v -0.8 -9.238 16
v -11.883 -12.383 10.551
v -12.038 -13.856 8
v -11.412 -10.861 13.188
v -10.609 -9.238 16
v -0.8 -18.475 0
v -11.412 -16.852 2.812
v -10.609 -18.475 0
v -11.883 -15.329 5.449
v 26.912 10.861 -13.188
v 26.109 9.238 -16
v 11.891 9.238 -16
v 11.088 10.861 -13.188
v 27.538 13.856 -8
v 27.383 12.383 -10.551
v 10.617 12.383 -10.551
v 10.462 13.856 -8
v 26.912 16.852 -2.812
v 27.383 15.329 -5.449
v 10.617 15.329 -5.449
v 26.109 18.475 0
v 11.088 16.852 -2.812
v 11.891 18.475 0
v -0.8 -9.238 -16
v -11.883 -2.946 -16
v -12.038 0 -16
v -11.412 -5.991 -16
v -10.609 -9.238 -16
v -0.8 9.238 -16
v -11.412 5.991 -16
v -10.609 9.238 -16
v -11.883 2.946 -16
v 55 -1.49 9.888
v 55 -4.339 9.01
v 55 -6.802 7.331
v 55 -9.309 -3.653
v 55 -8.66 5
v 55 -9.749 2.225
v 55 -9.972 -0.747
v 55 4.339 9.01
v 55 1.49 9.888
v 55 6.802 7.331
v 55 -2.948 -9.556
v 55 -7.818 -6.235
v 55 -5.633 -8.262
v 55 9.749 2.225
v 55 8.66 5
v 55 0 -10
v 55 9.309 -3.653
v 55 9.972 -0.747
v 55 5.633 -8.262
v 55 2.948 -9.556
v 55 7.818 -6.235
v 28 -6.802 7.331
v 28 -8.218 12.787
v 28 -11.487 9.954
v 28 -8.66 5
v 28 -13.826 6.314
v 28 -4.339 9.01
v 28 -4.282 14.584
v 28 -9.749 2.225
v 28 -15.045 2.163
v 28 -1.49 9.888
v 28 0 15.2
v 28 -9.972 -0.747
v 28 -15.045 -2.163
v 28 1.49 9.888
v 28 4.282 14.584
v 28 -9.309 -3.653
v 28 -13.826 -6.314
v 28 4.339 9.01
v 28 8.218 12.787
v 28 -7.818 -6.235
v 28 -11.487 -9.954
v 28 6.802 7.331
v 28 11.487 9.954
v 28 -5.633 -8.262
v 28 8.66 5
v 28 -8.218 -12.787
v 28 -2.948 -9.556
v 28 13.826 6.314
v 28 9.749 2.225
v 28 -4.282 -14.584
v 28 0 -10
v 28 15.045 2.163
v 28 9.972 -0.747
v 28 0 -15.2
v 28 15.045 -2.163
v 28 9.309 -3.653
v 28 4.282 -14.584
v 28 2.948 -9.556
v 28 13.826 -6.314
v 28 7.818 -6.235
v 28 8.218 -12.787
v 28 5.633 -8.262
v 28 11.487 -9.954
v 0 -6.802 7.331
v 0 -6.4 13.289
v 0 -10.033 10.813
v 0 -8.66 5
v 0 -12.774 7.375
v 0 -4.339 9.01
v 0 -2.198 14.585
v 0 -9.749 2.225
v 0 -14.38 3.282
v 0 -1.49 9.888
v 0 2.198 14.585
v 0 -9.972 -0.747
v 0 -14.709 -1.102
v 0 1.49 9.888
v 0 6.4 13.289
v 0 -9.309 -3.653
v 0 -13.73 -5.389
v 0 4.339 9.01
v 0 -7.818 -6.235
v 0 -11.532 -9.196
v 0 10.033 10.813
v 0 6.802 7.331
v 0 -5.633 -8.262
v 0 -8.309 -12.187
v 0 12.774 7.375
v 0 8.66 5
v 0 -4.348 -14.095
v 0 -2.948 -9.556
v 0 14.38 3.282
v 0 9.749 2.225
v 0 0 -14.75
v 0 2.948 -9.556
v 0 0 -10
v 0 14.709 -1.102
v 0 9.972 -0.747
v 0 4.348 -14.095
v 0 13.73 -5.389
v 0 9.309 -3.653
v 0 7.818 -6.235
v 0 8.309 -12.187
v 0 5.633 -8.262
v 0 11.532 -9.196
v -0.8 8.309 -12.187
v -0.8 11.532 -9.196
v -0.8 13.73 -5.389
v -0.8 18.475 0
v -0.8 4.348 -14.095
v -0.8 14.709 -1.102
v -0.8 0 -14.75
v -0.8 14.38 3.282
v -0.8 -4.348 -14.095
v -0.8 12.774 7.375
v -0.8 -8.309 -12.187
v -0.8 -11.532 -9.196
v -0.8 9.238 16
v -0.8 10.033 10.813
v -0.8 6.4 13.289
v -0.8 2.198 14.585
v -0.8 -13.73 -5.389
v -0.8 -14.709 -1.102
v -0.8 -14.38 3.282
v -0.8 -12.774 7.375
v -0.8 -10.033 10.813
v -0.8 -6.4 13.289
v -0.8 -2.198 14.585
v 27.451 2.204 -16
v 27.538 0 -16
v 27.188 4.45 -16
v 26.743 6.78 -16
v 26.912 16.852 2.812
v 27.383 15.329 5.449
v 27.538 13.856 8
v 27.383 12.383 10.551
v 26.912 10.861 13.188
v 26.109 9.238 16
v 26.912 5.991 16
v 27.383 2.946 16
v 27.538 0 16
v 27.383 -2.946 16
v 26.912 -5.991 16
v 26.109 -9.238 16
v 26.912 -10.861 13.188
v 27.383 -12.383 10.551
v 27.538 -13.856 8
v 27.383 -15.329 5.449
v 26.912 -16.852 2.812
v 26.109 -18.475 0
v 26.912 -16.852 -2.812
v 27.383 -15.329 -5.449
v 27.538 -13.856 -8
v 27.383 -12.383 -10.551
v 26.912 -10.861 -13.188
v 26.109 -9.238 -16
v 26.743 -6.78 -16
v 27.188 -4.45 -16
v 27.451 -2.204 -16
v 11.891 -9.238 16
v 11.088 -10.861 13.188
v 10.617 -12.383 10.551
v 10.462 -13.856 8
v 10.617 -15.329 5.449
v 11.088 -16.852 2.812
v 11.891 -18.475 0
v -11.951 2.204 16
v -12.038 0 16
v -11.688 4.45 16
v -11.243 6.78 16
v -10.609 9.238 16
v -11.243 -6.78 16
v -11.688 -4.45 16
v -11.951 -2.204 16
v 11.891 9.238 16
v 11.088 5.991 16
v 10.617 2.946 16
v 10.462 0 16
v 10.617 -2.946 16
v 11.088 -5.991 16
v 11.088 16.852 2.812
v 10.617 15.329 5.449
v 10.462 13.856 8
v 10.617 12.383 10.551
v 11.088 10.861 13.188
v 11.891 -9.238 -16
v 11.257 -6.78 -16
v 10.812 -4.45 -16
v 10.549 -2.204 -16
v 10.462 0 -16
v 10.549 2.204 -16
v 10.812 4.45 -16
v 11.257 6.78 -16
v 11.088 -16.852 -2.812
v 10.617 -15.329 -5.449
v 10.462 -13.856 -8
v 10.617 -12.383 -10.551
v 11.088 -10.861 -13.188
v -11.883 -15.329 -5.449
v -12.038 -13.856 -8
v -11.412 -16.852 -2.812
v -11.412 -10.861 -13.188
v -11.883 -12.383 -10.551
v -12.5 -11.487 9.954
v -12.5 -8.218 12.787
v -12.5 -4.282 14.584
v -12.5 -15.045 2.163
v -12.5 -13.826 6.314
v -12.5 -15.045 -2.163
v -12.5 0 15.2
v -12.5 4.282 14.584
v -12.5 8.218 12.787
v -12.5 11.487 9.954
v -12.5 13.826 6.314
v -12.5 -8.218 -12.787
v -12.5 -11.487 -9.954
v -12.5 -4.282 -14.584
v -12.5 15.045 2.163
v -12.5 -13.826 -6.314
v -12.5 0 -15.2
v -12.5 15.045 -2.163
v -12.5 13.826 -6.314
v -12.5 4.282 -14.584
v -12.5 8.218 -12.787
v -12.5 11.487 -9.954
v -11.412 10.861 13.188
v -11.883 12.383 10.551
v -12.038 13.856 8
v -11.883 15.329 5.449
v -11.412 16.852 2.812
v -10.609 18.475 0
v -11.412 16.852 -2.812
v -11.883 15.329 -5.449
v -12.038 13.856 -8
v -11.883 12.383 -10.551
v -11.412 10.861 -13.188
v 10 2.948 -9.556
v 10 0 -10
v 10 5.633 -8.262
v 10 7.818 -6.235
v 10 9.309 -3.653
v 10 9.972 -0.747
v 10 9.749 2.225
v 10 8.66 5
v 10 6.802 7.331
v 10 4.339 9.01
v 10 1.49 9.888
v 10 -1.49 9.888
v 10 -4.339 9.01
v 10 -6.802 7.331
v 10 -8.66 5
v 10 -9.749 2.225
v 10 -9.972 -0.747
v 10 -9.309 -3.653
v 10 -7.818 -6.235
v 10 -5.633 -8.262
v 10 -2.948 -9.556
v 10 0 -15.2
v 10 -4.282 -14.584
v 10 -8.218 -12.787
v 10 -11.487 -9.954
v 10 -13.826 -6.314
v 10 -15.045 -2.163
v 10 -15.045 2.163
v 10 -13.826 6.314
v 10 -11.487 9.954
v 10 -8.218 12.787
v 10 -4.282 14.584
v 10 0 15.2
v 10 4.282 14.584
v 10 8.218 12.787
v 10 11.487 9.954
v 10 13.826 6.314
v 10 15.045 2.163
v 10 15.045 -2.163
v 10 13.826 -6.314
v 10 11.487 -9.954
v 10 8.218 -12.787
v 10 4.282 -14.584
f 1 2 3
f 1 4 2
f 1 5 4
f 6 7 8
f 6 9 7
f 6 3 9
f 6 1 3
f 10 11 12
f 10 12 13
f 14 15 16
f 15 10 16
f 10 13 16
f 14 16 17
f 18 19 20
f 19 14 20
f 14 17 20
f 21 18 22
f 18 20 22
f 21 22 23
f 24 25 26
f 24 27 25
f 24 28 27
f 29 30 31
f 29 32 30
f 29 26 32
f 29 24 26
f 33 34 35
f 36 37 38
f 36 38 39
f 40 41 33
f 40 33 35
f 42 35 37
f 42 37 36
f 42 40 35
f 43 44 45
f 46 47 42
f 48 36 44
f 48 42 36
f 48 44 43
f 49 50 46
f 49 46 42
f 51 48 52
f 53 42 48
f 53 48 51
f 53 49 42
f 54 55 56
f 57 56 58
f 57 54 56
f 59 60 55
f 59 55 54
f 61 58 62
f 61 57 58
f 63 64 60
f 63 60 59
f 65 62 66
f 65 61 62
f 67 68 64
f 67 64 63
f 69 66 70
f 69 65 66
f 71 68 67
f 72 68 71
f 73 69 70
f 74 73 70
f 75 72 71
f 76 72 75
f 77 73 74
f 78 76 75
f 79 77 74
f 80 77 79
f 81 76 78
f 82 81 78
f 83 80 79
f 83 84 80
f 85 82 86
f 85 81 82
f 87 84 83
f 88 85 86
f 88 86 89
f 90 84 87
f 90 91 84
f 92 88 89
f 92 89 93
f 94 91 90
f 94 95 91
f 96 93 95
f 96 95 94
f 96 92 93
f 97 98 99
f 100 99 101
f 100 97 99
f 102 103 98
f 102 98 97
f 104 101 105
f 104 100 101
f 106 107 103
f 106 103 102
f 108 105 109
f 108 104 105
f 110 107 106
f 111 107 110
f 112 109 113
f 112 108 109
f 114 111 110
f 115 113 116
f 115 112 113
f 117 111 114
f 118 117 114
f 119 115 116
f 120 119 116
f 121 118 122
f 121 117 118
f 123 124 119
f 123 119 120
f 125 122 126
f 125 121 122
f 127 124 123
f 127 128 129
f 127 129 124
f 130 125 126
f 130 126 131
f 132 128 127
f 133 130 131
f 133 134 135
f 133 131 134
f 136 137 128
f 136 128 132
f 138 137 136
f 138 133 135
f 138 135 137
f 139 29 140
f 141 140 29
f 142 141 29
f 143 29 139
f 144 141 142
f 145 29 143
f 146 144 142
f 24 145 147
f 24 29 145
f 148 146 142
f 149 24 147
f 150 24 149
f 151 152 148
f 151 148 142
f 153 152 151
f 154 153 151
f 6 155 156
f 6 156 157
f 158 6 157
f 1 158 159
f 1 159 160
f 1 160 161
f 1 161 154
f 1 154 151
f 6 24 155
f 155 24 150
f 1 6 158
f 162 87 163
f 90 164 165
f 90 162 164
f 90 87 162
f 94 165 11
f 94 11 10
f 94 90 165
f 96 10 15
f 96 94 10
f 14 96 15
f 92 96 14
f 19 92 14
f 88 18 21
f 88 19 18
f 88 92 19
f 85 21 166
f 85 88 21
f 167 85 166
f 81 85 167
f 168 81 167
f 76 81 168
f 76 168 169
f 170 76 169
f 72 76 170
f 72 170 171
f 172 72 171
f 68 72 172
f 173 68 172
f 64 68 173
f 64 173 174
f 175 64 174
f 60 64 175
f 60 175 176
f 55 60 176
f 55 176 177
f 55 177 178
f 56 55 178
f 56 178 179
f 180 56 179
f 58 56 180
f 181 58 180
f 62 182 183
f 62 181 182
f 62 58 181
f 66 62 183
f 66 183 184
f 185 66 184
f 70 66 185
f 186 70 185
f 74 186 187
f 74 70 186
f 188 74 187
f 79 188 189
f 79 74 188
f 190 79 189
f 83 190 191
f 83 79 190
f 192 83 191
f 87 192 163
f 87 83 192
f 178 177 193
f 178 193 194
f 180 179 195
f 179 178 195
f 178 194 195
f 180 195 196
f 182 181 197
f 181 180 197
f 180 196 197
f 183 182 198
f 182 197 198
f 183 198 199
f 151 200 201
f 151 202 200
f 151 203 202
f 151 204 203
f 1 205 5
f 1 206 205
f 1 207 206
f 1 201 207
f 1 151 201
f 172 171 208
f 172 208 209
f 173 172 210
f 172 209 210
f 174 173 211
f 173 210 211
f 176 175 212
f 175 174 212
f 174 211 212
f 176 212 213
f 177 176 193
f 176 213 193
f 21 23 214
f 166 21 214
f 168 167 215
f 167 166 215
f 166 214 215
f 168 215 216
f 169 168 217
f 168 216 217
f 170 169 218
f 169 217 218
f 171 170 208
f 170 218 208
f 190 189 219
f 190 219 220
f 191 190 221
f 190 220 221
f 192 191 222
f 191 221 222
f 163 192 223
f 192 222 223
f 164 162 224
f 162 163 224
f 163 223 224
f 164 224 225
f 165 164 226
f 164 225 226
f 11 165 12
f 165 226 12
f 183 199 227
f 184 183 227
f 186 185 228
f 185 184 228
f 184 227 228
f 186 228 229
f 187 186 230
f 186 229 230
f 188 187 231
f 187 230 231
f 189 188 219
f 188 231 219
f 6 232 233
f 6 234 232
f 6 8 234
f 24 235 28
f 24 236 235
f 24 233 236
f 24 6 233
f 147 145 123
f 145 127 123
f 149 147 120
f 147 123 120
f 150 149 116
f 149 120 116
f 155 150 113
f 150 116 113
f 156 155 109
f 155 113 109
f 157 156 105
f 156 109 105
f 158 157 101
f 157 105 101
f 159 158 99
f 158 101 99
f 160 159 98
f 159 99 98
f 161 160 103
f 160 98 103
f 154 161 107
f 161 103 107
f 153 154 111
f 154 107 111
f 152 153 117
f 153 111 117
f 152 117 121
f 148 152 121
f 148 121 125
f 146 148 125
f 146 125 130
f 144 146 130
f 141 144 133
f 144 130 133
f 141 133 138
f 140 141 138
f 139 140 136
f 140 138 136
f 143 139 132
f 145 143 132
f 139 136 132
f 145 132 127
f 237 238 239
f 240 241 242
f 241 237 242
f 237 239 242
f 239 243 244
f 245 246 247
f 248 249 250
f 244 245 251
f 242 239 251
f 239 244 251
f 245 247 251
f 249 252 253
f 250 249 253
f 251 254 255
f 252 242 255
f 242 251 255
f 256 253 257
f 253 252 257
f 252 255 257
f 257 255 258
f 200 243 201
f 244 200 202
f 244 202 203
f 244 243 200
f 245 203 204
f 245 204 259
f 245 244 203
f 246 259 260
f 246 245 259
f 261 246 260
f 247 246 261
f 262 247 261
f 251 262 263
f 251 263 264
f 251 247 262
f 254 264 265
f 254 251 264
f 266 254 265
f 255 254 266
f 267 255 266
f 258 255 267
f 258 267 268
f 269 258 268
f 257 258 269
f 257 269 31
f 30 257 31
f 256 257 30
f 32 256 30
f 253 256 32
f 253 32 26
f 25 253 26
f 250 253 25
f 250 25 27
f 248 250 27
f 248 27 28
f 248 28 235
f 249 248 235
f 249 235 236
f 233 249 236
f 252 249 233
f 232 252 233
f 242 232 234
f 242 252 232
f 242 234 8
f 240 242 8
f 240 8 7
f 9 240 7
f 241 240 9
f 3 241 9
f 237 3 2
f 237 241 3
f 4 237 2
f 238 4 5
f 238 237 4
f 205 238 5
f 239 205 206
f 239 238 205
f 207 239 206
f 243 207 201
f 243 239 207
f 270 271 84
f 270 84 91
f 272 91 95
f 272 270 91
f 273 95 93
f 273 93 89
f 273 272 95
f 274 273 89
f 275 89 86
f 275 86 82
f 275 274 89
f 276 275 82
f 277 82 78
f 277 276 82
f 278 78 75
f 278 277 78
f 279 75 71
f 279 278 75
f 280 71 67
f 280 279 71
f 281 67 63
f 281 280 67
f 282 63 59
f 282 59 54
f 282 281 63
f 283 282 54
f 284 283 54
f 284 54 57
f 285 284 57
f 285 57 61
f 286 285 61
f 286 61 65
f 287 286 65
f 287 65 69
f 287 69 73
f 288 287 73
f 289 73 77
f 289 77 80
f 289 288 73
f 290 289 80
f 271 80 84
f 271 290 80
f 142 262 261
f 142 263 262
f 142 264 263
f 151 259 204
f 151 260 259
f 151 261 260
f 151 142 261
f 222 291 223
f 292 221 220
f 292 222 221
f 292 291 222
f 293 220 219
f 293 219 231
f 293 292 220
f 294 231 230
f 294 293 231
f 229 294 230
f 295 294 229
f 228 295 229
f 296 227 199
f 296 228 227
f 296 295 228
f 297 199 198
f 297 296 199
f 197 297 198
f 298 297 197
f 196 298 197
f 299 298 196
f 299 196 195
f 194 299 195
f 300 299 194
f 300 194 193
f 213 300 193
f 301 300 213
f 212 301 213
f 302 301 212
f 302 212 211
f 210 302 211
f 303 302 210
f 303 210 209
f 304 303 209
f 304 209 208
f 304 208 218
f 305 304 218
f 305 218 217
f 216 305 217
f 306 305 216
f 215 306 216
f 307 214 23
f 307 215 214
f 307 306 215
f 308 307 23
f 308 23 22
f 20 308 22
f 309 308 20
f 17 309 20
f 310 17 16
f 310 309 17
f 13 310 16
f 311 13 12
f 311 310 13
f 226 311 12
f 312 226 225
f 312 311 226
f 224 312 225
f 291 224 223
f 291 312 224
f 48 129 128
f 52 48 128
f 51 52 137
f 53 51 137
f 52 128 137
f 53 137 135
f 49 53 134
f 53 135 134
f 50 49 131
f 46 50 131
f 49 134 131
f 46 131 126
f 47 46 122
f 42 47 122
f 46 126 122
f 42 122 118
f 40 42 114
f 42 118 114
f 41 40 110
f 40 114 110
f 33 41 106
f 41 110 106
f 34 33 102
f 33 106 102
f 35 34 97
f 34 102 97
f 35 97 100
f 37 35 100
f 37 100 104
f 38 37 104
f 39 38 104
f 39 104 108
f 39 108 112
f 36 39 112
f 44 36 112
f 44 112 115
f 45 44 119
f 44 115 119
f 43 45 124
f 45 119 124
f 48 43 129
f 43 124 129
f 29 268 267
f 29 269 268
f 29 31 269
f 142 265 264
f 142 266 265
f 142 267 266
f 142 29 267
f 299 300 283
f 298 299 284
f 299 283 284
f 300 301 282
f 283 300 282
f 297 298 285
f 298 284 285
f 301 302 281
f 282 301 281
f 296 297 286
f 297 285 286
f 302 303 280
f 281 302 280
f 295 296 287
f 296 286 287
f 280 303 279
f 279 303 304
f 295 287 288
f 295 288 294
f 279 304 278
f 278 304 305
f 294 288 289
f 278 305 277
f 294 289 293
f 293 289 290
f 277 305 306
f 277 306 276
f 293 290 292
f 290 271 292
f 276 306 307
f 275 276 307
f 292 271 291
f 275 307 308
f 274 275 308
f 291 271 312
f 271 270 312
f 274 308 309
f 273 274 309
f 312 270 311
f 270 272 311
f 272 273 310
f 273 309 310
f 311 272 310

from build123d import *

# Parameters (mm, degrees)
BOLTHEAD_DEPTH                       = 12.5
UNBOLTHEADSK_W                       = 0.8
UNBOLTHEADSK_H                       = 3.725208614
BOLTBODYSK_R                         = 10
BOLTBODY_DEPTH                       = 55
BOLTHCSK_OUTSIDE_W                   = 302.814
BOLTHCSK_OUTSIDE_H                   = 307.764
BOLTHCSK_OUTSIDE_R                   = 15.2
BOLTHEADCHAMFER_DEPTH                = 72.788462397
BOLTHEADCHAMFER_DRAFT                = -60
NUTHEADSK_R                          = 10
NUTHEAD_DEPTH                        = 18
NUTHCSK_OUTSIDE_W                    = 217.994
NUTHCSK_OUTSIDE_H                    = 222.944
NUTHCSK_OUTSIDE_R                    = 15.2
NUTHEADCHAMFER_DEPTH                 = 48.303100674
NUTHEADCHAMFER_DRAFT                 = -60
NUTHEADCHAMFERMIRROR_COPY_1_SKETCH_W = 217.994
NUTHEADCHAMFERMIRROR_COPY_1_SKETCH_H = 222.944
NUTHEADCHAMFERMIRROR_COPY_1_SKETCH_R = 15.2
NUTHEADCHAMFERMIRROR_COPY_1_DEPTH    = 48.303100674
NUTHEADCHAMFERMIRROR_COPY_1_DRAFT    = -60


with BuildPart() as part:
    # BoltHeadSk → BoltHead (new body)
    with BuildSketch(Plane(origin=(0, 0, 0), x_dir=(0, 0, -1), z_dir=(1, 0, 0))):
        Polygon((0, 18.475208614), (-16, 9.237604307), (-16, -9.237604307), (0, -18.475208614), (16, -9.237604307), (16, 9.237604307), align=None)
    extrude(amount=-BOLTHEAD_DEPTH)

    # UnBoltHeadSk → UNBoltHead (revolve, cut)
    with BuildSketch(Plane.XY, mode=Mode.PRIVATE) as unbolthead_sk:
        with Locations((-0.4, 16.612604307)):
            Rectangle(UNBOLTHEADSK_W, UNBOLTHEADSK_H)
    revolve(unbolthead_sk.sketch.rotate(Axis((0, 0, 0), (-1, 0, 0)), 90), axis=Axis((0, 0, 0), (-1, 0, 0)), mode=Mode.SUBTRACT)

    # BoltBodySk → BoltBody (add)
    with BuildSketch(Plane(origin=(0, 0, 0), x_dir=(0, 0, -1), z_dir=(1, 0, 0))):
        Circle(BOLTBODYSK_R)
    extrude(amount=BOLTBODY_DEPTH)


with BuildPart() as boltheadchamfer_tool:
    # BoltHCSk outside → BoltHeadChamfer (with draft: the straight prism first)
    with BuildSketch(Plane.ZY.offset(12.5)):
        Rectangle(BOLTHCSK_OUTSIDE_W, BOLTHCSK_OUTSIDE_H)
        Circle(BOLTHCSK_OUTSIDE_R, mode=Mode.SUBTRACT)
    extrude(amount=-BOLTHEADCHAMFER_DEPTH)
    # BoltHeadChamfer: the draft: its side faces are tilted about the plane it starts from
    boltheadchamfer_sides = [boltheadchamfer_tool.faces().sort_by_distance(p)[0] for p in [
        (23.894231199, -153.882, 0),
        (23.894231199, 0, 151.407),
        (23.894231199, 153.882, 0),
        (23.894231199, 0, -151.407),
        (23.894231199, 0, -15.2),
    ]]
    draft(boltheadchamfer_sides, Plane.ZY.offset(12.5), BOLTHEADCHAMFER_DRAFT)


with BuildPart() as part_1:
    add(part.part)

    # BoltHeadChamfer: cut by boltheadchamfer_tool
    add(boltheadchamfer_tool.part, mode=Mode.SUBTRACT)


with BuildPart() as body_2:
    # NutHeadSk → NutHead (new body)
    with BuildSketch(Plane(origin=(10, 0, 0), x_dir=(0, 0, -1), z_dir=(1, 0, 0))):
        Polygon((-16, 9.237604307), (-16, -9.237604307), (0, -18.475208614), (16, -9.237604307), (16, 9.237604307), (0, 18.475208614), align=None)
        Circle(NUTHEADSK_R, mode=Mode.SUBTRACT)
    extrude(amount=NUTHEAD_DEPTH)


with BuildPart() as nutheadchamfer_tool:
    # NutHCSk outside → NutHeadChamfer (with draft: the straight prism first)
    with BuildSketch(Plane(origin=(28, 0, 0), x_dir=(0, 0, -1), z_dir=(1, 0, 0))):
        Rectangle(NUTHCSK_OUTSIDE_W, NUTHCSK_OUTSIDE_H)
        Circle(NUTHCSK_OUTSIDE_R, mode=Mode.SUBTRACT)
    extrude(amount=-NUTHEADCHAMFER_DEPTH)
    # NutHeadChamfer: the draft: its side faces are tilted about the plane it starts from
    nutheadchamfer_sides = [nutheadchamfer_tool.faces().sort_by_distance(p)[0] for p in [
        (3.848449663, -111.472, 0),
        (3.848449663, 0, -108.997),
        (3.848449663, 111.472, 0),
        (3.848449663, 0, 108.997),
        (3.848449663, 0, 15.2),
    ]]
    draft(nutheadchamfer_sides, Plane(origin=(28, 0, 0), x_dir=(0, 0, -1), z_dir=(1, 0, 0)), NUTHEADCHAMFER_DRAFT)


with BuildPart() as body_2_1:
    add(body_2.part)

    # NutHeadChamfer: cut by nutheadchamfer_tool
    add(nutheadchamfer_tool.part, mode=Mode.SUBTRACT)


with BuildPart() as nutheadchamfermirror_copy_1_tool:
    # NutHeadChamferMirror copy 1 sketch → NutHeadChamferMirror copy 1 (with draft: the straight prism first)
    with BuildSketch(Plane(origin=(10, 0, 0), x_dir=(0, 0, -1), z_dir=(-1, 0, 0))):
        Rectangle(NUTHEADCHAMFERMIRROR_COPY_1_SKETCH_W, NUTHEADCHAMFERMIRROR_COPY_1_SKETCH_H)
        Circle(NUTHEADCHAMFERMIRROR_COPY_1_SKETCH_R, mode=Mode.SUBTRACT)
    extrude(amount=-NUTHEADCHAMFERMIRROR_COPY_1_DEPTH)
    # NutHeadChamferMirror copy 1: the draft: its side faces are tilted about the plane it starts from
    nutheadchamfermirror_copy_1_sides = [nutheadchamfermirror_copy_1_tool.faces().sort_by_distance(p)[0] for p in [
        (34.151550337, -111.472, 0),
        (34.151550337, 0, -108.997),
        (34.151550337, 111.472, 0),
        (34.151550337, 0, 108.997),
        (34.151550337, 0, 15.2),
    ]]
    draft(nutheadchamfermirror_copy_1_sides, Plane(origin=(10, 0, 0), x_dir=(0, 0, -1), z_dir=(-1, 0, 0)), NUTHEADCHAMFERMIRROR_COPY_1_DRAFT)


with BuildPart() as body_2_2:
    add(body_2_1.part)

    # NutHeadChamferMirror copy 1: cut by nutheadchamfermirror_copy_1_tool
    add(nutheadchamfermirror_copy_1_tool.part, mode=Mode.SUBTRACT)


solid = Compound([part_1.part, body_2_2.part])
